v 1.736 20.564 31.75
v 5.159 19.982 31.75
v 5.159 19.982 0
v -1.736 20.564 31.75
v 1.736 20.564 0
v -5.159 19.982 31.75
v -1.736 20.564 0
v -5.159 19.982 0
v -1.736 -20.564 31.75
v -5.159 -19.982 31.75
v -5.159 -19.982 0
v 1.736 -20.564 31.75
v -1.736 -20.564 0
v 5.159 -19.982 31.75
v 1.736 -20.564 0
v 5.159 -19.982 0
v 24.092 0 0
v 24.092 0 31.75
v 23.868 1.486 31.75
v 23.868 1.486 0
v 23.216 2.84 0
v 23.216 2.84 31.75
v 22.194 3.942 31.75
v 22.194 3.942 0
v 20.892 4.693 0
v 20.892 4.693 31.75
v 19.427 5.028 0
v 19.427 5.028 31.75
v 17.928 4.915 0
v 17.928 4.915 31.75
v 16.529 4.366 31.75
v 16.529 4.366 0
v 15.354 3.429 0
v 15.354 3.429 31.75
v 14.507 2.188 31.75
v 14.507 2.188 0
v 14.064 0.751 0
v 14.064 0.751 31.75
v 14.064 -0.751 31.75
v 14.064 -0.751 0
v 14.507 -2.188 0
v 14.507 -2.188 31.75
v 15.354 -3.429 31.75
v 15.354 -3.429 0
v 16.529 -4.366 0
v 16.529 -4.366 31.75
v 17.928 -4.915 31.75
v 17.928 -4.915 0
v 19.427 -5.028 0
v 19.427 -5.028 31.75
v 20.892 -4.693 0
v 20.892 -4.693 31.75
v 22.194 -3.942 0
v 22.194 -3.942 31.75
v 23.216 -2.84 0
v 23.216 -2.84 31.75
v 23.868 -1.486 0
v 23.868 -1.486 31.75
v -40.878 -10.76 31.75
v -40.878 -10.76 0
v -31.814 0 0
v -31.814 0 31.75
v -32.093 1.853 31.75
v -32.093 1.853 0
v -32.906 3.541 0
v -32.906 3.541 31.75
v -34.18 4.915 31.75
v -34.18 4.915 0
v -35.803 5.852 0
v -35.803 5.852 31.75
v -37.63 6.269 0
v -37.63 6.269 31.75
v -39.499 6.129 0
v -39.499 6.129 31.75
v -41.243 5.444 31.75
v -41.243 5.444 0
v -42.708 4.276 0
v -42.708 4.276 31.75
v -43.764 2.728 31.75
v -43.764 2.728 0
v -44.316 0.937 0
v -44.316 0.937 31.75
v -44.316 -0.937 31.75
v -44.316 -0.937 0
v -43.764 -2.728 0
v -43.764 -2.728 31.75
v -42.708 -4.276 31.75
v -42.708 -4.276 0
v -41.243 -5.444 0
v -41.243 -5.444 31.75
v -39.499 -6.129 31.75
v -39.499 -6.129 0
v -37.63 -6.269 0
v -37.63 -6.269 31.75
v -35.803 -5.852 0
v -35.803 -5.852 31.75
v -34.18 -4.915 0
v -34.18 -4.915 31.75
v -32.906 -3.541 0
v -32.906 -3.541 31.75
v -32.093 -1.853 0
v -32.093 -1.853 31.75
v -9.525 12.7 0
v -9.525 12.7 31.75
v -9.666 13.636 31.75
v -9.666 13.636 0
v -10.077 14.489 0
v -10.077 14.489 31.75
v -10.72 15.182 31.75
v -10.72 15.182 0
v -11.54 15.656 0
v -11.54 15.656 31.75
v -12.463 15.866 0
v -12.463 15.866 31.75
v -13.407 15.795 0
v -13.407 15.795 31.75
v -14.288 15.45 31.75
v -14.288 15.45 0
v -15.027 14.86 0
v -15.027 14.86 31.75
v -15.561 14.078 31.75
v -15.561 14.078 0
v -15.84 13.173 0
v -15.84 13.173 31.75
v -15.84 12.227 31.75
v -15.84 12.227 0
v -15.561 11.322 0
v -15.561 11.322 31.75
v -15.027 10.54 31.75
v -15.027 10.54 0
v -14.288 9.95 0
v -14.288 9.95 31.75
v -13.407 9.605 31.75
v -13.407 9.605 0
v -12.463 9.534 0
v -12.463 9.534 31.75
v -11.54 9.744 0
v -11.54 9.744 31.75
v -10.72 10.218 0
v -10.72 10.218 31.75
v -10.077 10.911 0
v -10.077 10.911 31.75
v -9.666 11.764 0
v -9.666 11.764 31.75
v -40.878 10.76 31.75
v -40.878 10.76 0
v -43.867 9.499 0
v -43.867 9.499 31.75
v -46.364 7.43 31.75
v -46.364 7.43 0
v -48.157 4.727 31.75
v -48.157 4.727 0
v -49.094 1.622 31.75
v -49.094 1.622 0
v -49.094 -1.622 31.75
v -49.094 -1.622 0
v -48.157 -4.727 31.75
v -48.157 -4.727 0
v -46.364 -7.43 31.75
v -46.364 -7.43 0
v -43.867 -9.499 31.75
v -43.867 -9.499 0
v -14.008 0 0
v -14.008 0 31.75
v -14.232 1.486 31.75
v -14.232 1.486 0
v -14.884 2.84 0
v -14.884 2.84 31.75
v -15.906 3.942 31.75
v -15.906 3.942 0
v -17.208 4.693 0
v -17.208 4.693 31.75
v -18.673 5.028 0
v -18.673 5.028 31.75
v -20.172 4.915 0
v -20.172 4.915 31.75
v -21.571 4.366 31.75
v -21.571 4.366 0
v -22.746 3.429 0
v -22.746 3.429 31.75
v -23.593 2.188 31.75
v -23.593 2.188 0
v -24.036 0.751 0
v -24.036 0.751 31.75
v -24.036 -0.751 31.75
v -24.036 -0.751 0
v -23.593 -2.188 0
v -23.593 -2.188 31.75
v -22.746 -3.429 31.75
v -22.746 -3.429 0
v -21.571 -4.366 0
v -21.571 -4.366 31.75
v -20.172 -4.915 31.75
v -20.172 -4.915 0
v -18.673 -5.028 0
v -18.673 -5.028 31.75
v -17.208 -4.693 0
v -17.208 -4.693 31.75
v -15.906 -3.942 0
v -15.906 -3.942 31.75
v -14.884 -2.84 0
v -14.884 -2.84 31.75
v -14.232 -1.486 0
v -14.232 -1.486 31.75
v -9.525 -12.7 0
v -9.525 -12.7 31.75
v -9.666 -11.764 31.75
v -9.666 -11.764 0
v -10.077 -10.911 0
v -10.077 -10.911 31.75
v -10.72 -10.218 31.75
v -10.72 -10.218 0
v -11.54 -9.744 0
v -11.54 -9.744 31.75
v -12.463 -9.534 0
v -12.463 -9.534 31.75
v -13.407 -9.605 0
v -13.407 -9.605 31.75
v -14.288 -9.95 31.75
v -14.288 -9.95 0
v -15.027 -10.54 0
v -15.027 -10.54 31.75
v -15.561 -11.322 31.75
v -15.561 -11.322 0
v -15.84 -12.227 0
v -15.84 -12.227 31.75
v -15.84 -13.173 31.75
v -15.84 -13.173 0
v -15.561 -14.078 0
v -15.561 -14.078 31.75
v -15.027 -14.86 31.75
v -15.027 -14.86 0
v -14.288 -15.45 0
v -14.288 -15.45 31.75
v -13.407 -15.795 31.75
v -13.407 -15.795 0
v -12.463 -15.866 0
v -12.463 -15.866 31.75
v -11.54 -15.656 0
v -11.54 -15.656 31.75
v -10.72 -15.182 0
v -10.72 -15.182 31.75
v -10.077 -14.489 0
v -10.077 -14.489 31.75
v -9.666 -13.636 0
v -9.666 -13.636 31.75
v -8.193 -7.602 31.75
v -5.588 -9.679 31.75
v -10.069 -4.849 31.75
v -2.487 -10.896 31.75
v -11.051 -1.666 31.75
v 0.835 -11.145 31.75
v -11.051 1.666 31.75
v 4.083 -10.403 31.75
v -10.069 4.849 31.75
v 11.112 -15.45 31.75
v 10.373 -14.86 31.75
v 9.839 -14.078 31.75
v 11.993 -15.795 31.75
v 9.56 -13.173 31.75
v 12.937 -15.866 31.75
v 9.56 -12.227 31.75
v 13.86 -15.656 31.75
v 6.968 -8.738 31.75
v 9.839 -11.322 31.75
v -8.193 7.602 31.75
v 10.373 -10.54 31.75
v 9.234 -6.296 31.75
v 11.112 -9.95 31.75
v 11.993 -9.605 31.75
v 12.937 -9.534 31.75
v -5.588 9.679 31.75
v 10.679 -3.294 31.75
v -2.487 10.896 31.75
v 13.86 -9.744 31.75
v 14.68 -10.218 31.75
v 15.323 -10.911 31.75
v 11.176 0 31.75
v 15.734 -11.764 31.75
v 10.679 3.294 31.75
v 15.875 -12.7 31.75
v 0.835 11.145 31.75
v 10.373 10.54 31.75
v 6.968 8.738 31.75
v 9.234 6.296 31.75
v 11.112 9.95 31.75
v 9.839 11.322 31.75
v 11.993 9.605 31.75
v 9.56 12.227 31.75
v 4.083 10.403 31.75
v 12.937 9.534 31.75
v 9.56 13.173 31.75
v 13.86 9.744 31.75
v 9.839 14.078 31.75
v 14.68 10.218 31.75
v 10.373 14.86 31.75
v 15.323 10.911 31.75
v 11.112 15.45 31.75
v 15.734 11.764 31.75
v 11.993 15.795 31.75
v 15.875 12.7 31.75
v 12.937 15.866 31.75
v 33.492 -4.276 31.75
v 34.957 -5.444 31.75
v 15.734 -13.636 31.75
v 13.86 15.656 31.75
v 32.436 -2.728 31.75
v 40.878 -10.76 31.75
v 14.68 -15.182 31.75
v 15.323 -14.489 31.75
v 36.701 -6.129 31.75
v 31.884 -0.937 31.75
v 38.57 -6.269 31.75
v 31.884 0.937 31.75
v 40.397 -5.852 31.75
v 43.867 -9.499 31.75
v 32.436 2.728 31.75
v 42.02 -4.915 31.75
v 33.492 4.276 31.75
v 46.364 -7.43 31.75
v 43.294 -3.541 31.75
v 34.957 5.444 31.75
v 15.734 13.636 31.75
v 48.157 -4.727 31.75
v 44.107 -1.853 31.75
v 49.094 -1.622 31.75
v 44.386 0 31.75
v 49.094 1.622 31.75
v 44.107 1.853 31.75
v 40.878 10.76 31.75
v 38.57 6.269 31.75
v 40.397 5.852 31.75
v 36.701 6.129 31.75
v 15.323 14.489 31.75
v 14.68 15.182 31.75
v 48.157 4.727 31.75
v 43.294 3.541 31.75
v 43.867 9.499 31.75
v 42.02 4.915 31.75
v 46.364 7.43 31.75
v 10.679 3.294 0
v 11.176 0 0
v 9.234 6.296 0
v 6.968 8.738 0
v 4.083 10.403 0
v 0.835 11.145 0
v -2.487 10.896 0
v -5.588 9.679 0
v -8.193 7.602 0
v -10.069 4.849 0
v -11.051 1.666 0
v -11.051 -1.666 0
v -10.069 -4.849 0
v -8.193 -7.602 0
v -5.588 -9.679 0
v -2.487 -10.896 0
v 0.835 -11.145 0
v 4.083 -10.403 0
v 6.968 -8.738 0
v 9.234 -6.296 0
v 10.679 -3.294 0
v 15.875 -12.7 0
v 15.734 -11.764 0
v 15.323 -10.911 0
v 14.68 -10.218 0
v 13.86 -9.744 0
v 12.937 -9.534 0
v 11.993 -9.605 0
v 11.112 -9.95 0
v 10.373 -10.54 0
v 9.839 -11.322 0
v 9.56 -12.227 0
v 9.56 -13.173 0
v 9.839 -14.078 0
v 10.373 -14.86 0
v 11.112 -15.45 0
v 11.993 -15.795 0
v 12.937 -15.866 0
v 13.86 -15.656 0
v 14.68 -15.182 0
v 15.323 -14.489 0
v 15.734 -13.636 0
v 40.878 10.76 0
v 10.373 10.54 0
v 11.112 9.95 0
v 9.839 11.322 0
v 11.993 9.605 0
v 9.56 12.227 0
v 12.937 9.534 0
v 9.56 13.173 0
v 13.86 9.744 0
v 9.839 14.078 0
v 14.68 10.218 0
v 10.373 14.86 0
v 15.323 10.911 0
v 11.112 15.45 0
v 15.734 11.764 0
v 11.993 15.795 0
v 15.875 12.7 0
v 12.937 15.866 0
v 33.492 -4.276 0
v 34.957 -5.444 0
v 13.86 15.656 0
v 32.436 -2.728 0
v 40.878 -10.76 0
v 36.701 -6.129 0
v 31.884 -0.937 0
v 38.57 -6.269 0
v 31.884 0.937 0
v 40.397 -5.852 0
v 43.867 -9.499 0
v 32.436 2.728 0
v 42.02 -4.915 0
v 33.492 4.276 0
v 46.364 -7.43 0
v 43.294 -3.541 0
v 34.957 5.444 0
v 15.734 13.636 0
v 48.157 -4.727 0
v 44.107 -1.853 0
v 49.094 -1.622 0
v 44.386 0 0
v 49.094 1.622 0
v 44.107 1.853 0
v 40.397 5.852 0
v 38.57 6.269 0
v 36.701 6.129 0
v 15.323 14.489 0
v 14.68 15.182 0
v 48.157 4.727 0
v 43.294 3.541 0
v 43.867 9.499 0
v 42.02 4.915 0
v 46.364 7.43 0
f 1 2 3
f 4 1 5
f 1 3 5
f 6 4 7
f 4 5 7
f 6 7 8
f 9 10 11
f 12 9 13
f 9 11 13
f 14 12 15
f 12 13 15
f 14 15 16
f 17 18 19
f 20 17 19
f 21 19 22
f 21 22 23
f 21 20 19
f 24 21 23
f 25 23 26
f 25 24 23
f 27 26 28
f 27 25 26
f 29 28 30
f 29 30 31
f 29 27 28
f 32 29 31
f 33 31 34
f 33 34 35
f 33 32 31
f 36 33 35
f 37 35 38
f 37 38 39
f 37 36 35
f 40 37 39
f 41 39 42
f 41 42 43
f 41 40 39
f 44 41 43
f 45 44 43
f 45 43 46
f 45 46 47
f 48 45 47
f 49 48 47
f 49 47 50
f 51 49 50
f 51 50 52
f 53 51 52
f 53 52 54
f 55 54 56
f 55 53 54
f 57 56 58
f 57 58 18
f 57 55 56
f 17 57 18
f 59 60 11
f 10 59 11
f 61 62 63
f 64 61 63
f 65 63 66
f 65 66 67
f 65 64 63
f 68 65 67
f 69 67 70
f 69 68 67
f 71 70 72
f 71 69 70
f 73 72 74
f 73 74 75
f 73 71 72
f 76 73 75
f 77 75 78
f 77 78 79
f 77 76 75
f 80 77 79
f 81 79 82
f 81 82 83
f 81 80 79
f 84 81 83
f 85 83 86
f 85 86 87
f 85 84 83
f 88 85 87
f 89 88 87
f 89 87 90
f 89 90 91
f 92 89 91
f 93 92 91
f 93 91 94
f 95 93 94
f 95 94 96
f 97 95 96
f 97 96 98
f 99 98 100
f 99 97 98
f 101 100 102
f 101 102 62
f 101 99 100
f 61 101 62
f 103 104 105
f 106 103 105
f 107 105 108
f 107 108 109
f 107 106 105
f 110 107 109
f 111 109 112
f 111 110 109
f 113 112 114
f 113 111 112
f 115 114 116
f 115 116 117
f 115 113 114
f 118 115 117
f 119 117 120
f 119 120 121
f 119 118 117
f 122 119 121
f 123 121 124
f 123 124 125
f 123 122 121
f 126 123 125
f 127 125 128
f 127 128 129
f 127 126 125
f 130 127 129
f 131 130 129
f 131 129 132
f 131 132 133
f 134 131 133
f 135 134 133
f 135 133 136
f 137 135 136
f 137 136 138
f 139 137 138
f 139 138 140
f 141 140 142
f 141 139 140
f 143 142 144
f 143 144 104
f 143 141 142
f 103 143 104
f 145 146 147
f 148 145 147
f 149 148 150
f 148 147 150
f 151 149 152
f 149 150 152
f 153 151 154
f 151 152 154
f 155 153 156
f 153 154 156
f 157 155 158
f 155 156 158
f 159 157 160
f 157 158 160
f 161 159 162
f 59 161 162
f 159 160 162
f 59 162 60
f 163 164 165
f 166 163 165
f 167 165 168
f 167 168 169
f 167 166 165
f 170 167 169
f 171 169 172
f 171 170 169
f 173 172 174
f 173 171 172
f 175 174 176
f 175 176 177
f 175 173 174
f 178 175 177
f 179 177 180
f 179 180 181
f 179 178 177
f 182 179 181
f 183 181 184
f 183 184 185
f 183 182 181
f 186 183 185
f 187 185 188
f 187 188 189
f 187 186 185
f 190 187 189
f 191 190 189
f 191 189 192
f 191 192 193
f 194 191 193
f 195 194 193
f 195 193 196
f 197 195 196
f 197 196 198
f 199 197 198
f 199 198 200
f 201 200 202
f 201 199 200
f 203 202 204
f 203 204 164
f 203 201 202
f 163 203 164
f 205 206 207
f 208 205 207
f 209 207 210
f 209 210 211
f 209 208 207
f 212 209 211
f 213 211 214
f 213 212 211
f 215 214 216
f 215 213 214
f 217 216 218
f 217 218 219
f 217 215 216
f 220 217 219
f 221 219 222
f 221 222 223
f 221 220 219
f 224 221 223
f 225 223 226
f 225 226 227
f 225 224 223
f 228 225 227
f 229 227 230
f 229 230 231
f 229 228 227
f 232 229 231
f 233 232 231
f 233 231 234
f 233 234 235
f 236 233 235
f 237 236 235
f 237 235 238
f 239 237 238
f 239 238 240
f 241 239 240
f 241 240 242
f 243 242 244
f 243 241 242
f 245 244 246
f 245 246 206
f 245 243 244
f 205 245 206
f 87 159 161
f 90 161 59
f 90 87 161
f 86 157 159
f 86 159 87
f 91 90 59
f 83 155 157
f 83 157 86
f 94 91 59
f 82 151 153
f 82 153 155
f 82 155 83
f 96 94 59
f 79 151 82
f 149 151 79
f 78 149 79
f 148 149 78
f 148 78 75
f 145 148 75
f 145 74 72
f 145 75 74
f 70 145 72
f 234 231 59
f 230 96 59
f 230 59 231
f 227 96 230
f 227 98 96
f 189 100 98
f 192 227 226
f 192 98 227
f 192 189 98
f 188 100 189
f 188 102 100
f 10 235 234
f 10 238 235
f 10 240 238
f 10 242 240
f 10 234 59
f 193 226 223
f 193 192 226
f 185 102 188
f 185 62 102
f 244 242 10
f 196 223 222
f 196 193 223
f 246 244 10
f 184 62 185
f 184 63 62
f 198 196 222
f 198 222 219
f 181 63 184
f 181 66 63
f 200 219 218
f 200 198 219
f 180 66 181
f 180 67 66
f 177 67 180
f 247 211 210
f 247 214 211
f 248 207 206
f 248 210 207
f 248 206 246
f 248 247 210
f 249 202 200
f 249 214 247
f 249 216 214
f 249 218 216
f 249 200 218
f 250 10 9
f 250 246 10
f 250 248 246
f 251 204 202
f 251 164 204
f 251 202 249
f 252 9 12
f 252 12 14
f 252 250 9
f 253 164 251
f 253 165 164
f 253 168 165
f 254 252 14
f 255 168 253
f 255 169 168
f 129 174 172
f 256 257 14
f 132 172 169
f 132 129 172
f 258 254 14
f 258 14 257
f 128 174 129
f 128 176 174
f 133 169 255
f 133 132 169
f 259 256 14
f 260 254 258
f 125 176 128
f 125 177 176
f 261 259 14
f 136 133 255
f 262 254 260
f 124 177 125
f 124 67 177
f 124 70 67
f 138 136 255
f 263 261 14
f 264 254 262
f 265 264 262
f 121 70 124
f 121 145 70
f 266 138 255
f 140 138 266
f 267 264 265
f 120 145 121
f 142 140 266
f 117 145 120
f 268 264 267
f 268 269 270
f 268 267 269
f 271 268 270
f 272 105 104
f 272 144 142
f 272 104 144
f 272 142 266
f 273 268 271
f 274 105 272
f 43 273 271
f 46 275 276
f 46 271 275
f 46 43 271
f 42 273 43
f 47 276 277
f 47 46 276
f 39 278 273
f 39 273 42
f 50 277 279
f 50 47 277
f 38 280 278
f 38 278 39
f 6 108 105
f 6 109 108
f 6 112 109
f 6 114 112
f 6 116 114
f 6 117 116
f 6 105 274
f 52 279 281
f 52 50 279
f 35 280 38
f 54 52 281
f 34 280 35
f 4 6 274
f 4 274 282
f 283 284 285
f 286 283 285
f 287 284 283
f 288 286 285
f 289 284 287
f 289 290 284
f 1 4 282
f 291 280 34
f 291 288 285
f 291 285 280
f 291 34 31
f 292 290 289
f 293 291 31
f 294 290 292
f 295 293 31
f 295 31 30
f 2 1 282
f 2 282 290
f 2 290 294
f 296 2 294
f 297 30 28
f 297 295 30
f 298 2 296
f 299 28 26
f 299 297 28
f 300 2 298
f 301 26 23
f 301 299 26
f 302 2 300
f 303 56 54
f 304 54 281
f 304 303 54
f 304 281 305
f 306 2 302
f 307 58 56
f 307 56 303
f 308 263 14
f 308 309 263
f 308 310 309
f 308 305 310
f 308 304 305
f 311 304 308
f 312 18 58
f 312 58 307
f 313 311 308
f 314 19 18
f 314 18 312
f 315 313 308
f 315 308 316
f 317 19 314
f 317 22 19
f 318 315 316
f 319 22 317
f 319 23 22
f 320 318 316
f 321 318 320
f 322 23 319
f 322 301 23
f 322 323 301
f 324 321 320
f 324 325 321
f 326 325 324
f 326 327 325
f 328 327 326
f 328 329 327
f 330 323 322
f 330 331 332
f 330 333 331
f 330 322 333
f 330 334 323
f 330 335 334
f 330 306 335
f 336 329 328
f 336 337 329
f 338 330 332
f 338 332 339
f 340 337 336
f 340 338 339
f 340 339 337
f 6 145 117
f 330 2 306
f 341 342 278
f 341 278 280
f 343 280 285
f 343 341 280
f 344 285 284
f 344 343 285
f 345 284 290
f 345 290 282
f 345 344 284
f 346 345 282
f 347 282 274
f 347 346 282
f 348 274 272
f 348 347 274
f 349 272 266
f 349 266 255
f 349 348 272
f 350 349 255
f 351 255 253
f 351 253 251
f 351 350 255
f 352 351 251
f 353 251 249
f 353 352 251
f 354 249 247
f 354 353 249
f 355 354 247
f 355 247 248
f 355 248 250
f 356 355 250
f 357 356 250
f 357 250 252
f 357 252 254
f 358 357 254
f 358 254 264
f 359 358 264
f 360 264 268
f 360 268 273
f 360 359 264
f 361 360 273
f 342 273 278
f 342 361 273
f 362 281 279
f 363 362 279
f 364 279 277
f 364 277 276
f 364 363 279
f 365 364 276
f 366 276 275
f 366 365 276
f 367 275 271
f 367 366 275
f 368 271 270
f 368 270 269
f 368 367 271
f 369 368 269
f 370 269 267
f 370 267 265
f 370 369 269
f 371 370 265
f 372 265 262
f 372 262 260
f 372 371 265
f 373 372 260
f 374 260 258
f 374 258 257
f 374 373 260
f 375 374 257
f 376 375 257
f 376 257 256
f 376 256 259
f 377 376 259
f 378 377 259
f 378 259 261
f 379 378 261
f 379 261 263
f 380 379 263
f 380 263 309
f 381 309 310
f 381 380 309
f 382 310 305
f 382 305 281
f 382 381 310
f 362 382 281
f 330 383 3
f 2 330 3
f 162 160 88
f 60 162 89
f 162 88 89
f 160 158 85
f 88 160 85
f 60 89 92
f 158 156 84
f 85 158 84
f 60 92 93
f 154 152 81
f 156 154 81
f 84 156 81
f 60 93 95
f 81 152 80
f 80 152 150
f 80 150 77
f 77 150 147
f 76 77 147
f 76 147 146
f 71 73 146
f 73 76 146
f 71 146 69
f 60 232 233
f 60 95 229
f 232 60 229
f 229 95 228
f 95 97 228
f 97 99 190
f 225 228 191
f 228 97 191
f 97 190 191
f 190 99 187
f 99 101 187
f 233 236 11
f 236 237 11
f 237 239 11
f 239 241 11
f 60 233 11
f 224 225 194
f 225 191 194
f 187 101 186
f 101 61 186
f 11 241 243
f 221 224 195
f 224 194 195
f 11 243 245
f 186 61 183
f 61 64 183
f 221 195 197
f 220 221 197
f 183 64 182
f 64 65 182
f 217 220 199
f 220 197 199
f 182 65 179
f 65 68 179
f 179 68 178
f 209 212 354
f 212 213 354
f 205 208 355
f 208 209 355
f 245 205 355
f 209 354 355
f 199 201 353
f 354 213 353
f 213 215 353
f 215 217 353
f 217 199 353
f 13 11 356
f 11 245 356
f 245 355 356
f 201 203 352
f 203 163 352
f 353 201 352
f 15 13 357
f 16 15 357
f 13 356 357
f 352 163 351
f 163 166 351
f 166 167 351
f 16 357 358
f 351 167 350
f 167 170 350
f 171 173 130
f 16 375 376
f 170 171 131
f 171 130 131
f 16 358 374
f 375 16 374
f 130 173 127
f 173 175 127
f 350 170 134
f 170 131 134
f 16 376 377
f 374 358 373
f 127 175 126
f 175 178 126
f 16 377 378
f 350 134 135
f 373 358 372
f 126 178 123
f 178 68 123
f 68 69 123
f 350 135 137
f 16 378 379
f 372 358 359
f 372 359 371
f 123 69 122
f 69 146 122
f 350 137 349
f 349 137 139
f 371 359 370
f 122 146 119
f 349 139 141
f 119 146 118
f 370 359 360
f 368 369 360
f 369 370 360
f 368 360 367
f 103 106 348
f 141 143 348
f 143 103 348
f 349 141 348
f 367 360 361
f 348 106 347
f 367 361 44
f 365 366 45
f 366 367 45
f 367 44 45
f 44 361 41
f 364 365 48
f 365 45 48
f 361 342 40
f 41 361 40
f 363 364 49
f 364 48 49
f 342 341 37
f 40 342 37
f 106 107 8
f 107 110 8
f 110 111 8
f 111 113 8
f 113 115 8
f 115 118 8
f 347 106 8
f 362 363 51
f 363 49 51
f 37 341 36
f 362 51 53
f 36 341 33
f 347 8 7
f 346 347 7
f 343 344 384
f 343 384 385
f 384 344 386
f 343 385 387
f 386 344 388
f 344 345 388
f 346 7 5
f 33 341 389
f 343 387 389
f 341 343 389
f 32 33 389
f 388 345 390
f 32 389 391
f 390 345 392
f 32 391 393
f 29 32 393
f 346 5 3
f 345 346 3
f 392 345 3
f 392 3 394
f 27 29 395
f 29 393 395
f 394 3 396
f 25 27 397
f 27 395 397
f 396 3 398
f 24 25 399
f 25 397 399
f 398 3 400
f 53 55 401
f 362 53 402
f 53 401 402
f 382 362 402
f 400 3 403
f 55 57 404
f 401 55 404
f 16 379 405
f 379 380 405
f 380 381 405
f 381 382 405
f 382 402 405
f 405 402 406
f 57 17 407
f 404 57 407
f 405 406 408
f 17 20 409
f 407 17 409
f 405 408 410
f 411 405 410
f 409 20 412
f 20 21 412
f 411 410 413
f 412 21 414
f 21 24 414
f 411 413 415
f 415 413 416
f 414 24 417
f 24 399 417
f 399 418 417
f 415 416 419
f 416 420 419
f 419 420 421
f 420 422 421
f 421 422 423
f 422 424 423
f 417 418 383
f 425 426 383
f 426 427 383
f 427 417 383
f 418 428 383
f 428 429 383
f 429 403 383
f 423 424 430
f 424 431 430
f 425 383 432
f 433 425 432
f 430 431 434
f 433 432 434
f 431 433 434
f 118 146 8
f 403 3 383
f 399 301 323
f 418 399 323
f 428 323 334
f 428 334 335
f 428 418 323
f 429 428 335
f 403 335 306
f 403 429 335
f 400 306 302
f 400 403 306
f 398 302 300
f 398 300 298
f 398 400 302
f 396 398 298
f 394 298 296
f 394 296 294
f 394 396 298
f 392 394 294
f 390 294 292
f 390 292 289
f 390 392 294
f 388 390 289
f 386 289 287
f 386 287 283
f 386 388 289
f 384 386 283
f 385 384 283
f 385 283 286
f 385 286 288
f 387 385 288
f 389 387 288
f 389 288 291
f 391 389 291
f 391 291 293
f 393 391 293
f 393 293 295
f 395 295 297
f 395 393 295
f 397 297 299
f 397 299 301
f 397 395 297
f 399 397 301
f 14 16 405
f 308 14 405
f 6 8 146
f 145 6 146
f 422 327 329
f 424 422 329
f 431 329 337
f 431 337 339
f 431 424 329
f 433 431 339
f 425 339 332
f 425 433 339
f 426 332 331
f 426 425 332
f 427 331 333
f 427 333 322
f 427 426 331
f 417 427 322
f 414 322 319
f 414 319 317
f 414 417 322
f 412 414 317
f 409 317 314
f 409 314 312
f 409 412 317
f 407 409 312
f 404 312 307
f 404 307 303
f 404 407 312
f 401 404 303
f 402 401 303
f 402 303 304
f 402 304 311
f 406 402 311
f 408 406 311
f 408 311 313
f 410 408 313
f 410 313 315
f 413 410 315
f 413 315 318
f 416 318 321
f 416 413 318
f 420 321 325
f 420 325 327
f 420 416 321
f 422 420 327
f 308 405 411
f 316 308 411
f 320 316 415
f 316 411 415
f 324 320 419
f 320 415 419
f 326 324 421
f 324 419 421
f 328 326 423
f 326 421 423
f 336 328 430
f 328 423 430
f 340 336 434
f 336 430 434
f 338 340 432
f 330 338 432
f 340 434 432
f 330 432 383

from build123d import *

# Parameters (mm, degrees)
F0_R     = 3.175
F0_R_2   = 6.2865
F0_R_3   = 5.0419
F0_R_4   = 11.176
F1_DEPTH = 31.75


with BuildPart() as f1:
    # F0 (on Top) → F1 (new body)
    with BuildSketch(Plane.XY):
        with BuildLine():
            Line((-5.159375, 19.982173), (-40.878125, 10.759632))
            ThreePointArc((-40.878125, 10.759632), (-49.2125, 0), (-40.878125, -10.759632))
            Line((-40.878125, -10.759632), (-5.159375, -19.982173))
            ThreePointArc((-5.159375, -19.982173), (0, -20.6375), (5.159375, -19.982173))
            Line((5.159375, -19.982173), (40.878125, -10.759632))
            ThreePointArc((40.878125, -10.759632), (49.2125, 0), (40.878125, 10.759632))
            Line((40.878125, 10.759632), (5.159375, 19.982173))
            ThreePointArc((5.159375, 19.982173), (0, 20.6375), (-5.159375, 19.982173))
        make_face()
        with Locations((-12.7, -12.7)):
            Circle(F0_R, mode=Mode.SUBTRACT)
        with Locations((12.7, -12.7)):
            Circle(F0_R, mode=Mode.SUBTRACT)
        with Locations((-38.1, 0)):
            Circle(F0_R_2, mode=Mode.SUBTRACT)
        with Locations((-19.05, 0)):
            Circle(F0_R_3, mode=Mode.SUBTRACT)
        with Locations((-12.7, 12.7)):
            Circle(F0_R, mode=Mode.SUBTRACT)
        Circle(F0_R_4, mode=Mode.SUBTRACT)
        with Locations((19.05, 0)):
            Circle(F0_R_3, mode=Mode.SUBTRACT)
        with Locations((38.1, 0)):
            Circle(F0_R_2, mode=Mode.SUBTRACT)
        with Locations((12.7, 12.7)):
            Circle(F0_R, mode=Mode.SUBTRACT)
    extrude(amount=F1_DEPTH)


solid = f1.part
